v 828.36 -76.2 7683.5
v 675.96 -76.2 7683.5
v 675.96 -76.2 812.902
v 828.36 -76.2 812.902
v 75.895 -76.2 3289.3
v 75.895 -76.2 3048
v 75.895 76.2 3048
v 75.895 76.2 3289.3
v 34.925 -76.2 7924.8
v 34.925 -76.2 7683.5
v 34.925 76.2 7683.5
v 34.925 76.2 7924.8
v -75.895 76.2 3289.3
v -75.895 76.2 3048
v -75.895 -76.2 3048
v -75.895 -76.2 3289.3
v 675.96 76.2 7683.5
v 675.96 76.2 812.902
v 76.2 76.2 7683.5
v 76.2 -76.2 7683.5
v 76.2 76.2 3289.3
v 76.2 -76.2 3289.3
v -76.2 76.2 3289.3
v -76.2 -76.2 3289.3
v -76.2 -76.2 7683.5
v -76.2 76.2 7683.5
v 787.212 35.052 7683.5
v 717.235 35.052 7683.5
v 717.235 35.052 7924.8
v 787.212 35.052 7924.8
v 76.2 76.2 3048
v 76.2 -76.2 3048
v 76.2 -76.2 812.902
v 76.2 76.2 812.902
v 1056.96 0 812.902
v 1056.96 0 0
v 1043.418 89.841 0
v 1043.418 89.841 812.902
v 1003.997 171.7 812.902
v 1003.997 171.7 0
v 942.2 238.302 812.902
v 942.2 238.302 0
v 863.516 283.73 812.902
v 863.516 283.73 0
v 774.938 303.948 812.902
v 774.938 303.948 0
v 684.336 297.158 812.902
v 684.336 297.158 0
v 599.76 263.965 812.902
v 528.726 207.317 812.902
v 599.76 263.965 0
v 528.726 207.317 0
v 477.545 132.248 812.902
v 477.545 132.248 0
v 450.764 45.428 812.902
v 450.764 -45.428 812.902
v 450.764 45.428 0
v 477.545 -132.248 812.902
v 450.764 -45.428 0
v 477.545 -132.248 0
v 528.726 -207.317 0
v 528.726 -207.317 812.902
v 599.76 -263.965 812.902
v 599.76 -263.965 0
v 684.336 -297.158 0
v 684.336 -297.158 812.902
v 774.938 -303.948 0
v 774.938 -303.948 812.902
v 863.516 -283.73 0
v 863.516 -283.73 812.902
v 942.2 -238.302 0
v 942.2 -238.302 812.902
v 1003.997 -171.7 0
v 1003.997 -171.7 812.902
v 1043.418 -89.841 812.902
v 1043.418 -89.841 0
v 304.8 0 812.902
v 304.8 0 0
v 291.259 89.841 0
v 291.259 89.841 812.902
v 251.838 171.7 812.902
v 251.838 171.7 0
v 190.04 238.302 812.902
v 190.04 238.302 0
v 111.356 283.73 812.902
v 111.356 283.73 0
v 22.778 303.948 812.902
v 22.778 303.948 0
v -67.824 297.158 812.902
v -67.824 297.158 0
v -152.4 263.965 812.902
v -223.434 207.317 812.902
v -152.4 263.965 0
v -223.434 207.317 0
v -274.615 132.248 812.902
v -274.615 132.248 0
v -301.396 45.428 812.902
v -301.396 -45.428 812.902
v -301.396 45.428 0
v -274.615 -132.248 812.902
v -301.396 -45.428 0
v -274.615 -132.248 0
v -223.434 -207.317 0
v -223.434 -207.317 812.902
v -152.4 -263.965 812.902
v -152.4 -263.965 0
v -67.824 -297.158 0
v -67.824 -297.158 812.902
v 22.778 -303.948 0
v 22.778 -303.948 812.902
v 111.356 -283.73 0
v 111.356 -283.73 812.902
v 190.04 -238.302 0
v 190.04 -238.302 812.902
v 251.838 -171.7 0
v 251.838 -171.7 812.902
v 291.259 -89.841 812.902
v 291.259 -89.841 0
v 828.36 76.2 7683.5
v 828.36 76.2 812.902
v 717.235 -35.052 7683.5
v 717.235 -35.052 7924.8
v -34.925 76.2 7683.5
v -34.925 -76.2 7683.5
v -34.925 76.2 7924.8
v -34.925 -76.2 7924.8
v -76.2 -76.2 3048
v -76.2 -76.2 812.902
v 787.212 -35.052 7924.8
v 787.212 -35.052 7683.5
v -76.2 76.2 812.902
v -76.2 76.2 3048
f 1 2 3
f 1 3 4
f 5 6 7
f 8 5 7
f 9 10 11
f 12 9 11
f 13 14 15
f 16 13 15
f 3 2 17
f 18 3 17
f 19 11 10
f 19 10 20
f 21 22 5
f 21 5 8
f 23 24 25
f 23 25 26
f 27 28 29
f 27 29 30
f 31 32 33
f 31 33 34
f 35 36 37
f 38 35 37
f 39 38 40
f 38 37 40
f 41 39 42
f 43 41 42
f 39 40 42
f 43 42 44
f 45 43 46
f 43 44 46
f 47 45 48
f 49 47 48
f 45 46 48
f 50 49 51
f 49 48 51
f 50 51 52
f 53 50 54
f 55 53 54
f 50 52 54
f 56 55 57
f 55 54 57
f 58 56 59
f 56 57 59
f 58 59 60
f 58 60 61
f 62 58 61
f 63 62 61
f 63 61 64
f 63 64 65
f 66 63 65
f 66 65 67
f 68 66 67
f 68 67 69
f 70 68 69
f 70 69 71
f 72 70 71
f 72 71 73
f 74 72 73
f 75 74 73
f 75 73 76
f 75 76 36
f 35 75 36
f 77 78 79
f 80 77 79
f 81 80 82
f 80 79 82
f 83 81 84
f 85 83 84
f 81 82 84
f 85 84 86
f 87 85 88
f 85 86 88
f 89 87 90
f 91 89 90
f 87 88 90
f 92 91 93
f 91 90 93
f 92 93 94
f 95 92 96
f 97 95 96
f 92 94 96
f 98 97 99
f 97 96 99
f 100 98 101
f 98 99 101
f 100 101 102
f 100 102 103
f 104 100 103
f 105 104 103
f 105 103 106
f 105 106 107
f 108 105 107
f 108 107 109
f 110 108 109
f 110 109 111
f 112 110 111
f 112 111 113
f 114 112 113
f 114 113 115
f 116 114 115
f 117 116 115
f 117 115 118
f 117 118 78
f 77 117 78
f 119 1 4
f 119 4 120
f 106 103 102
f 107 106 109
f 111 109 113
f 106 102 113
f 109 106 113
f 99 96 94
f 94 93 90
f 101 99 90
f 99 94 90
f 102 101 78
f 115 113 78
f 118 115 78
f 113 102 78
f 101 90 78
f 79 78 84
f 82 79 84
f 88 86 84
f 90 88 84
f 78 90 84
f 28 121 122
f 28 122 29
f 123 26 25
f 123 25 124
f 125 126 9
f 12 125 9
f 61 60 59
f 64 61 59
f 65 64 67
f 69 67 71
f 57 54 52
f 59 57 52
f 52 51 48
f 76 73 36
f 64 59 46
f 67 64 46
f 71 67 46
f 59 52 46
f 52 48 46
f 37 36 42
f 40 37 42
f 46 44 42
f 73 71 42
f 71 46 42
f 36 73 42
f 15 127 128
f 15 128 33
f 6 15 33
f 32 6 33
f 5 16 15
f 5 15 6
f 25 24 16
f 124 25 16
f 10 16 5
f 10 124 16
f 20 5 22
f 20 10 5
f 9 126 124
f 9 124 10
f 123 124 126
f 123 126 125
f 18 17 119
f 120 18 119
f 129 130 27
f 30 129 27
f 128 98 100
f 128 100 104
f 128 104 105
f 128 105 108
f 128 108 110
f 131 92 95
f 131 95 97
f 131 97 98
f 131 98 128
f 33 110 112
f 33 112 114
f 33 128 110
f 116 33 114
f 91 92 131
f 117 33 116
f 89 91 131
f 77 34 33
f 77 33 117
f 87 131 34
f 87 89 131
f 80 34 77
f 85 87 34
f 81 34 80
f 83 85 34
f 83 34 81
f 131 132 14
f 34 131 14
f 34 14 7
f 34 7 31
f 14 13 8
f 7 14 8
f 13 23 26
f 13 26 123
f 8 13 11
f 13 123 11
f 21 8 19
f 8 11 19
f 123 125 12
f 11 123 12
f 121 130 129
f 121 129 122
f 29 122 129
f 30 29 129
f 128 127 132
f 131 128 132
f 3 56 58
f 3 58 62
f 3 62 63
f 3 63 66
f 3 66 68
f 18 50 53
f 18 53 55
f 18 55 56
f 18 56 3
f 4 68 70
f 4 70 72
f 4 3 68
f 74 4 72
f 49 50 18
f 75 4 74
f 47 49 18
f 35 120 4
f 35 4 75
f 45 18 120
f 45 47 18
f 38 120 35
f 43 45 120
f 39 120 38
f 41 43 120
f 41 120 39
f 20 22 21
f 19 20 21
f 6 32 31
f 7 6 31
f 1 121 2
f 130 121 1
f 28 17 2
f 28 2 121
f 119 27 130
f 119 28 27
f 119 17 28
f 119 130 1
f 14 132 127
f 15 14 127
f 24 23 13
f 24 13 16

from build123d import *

# Parameters (mm, degrees)
F0_R      = 304.8
F1_DEPTH  = 7924.8
F2_R      = 304.8
F2_W      = 152.4
F2_H      = 152.4
F3_DEPTH  = 7111.8984
F4_W      = 41.275
F4_H      = 152.4
F5_DEPTH  = 241.3
F6_R      = 304.8
F6_W      = 152.4
F6_H      = 152.4
F7_DEPTH  = 7111.8984
F8_W      = 41.275
F8_H      = 41.148
F8_W_2    = 69.977
F8_H_2    = 70.104
F8_W_3    = 41.148
F9_DEPTH  = 241.3
F11_W     = 152.4
F11_H     = 241.3
F12_DEPTH = 0.3048
F10_W     = 152.4
F10_H     = 241.3
F13_DEPTH = 0.3048


with BuildPart() as f1:
    # F0 (on Top) → F1 (new body)
    with BuildSketch(Plane.XY):
        Circle(F0_R)
    extrude(amount=F1_DEPTH)

    # F2 (on face) → F3 (cut)
    with BuildSketch(Plane.XY.offset(7924.8)):
        Circle(F2_R)
        Rectangle(F2_W, F2_H, mode=Mode.SUBTRACT)
    extrude(amount=-F3_DEPTH, mode=Mode.SUBTRACT)

    # F4 (on face) → F5 (cut)
    with BuildSketch(Plane.XY.offset(7924.8)):
        with Locations((-55.5625, 0)):
            Rectangle(F4_W, F4_H)
        with Locations((55.5625, 0)):
            Rectangle(F4_W, F4_H)
    extrude(amount=-F5_DEPTH, mode=Mode.SUBTRACT)

    # F11 (on face) → F12 (cut)
    with BuildSketch(Plane(origin=(-76.2, 0, 0), x_dir=(0, -1, 0), z_dir=(-1, 0, 0))):
        with Locations((0, 3168.65)):
            Rectangle(F11_W, F11_H)
    extrude(amount=-F12_DEPTH, mode=Mode.SUBTRACT)

    # F10 (on face) → F13 (cut)
    with BuildSketch(Plane.YZ.offset(76.2)):
        with Locations((0, 3168.65)):
            Rectangle(F10_W, F10_H)
    extrude(amount=-F13_DEPTH, mode=Mode.SUBTRACT)


with BuildPart() as f1b:
    # F0 (on Top) → F1, piece 2 (new body)
    with BuildSketch(Plane.XY):
        with Locations((752.1598935127, 0)):
            Circle(F0_R)
    extrude(amount=F1_DEPTH)

    # F6 (on face) → F7 (cut)
    with BuildSketch(Plane.XY.offset(7924.8)):
        with Locations((752.1598935127, 0)):
            Circle(F6_R)
        with Locations((752.1598935127, 0)):
            Rectangle(F6_W, F6_H, mode=Mode.SUBTRACT)
    extrude(amount=-F7_DEPTH, mode=Mode.SUBTRACT)

    # F8 (on face) → F9 (cut)
    with BuildSketch(Plane.XY.offset(7924.8)):
        with Locations((696.5973935127, 55.626)):
            Rectangle(F8_W, F8_H)
        with Locations((696.5973935127, -55.626)):
            Rectangle(F8_W, F8_H)
        with Locations((752.2233935127, -55.626)):
            Rectangle(F8_W_2, F8_H)
        with Locations((696.5973935127, 0)):
            Rectangle(F8_W, F8_H_2)
        with Locations((752.2233935127, 55.626)):
            Rectangle(F8_W_2, F8_H)
        with Locations((807.7858935127, 55.626)):
            Rectangle(F8_W_3, F8_H)
        with Locations((807.7858935127, 0)):
            Rectangle(F8_W_3, F8_H_2)
        with Locations((807.7858935127, -55.626)):
            Rectangle(F8_W_3, F8_H)
    extrude(amount=-F9_DEPTH, mode=Mode.SUBTRACT)


solid = Compound([f1.part, f1b.part])
